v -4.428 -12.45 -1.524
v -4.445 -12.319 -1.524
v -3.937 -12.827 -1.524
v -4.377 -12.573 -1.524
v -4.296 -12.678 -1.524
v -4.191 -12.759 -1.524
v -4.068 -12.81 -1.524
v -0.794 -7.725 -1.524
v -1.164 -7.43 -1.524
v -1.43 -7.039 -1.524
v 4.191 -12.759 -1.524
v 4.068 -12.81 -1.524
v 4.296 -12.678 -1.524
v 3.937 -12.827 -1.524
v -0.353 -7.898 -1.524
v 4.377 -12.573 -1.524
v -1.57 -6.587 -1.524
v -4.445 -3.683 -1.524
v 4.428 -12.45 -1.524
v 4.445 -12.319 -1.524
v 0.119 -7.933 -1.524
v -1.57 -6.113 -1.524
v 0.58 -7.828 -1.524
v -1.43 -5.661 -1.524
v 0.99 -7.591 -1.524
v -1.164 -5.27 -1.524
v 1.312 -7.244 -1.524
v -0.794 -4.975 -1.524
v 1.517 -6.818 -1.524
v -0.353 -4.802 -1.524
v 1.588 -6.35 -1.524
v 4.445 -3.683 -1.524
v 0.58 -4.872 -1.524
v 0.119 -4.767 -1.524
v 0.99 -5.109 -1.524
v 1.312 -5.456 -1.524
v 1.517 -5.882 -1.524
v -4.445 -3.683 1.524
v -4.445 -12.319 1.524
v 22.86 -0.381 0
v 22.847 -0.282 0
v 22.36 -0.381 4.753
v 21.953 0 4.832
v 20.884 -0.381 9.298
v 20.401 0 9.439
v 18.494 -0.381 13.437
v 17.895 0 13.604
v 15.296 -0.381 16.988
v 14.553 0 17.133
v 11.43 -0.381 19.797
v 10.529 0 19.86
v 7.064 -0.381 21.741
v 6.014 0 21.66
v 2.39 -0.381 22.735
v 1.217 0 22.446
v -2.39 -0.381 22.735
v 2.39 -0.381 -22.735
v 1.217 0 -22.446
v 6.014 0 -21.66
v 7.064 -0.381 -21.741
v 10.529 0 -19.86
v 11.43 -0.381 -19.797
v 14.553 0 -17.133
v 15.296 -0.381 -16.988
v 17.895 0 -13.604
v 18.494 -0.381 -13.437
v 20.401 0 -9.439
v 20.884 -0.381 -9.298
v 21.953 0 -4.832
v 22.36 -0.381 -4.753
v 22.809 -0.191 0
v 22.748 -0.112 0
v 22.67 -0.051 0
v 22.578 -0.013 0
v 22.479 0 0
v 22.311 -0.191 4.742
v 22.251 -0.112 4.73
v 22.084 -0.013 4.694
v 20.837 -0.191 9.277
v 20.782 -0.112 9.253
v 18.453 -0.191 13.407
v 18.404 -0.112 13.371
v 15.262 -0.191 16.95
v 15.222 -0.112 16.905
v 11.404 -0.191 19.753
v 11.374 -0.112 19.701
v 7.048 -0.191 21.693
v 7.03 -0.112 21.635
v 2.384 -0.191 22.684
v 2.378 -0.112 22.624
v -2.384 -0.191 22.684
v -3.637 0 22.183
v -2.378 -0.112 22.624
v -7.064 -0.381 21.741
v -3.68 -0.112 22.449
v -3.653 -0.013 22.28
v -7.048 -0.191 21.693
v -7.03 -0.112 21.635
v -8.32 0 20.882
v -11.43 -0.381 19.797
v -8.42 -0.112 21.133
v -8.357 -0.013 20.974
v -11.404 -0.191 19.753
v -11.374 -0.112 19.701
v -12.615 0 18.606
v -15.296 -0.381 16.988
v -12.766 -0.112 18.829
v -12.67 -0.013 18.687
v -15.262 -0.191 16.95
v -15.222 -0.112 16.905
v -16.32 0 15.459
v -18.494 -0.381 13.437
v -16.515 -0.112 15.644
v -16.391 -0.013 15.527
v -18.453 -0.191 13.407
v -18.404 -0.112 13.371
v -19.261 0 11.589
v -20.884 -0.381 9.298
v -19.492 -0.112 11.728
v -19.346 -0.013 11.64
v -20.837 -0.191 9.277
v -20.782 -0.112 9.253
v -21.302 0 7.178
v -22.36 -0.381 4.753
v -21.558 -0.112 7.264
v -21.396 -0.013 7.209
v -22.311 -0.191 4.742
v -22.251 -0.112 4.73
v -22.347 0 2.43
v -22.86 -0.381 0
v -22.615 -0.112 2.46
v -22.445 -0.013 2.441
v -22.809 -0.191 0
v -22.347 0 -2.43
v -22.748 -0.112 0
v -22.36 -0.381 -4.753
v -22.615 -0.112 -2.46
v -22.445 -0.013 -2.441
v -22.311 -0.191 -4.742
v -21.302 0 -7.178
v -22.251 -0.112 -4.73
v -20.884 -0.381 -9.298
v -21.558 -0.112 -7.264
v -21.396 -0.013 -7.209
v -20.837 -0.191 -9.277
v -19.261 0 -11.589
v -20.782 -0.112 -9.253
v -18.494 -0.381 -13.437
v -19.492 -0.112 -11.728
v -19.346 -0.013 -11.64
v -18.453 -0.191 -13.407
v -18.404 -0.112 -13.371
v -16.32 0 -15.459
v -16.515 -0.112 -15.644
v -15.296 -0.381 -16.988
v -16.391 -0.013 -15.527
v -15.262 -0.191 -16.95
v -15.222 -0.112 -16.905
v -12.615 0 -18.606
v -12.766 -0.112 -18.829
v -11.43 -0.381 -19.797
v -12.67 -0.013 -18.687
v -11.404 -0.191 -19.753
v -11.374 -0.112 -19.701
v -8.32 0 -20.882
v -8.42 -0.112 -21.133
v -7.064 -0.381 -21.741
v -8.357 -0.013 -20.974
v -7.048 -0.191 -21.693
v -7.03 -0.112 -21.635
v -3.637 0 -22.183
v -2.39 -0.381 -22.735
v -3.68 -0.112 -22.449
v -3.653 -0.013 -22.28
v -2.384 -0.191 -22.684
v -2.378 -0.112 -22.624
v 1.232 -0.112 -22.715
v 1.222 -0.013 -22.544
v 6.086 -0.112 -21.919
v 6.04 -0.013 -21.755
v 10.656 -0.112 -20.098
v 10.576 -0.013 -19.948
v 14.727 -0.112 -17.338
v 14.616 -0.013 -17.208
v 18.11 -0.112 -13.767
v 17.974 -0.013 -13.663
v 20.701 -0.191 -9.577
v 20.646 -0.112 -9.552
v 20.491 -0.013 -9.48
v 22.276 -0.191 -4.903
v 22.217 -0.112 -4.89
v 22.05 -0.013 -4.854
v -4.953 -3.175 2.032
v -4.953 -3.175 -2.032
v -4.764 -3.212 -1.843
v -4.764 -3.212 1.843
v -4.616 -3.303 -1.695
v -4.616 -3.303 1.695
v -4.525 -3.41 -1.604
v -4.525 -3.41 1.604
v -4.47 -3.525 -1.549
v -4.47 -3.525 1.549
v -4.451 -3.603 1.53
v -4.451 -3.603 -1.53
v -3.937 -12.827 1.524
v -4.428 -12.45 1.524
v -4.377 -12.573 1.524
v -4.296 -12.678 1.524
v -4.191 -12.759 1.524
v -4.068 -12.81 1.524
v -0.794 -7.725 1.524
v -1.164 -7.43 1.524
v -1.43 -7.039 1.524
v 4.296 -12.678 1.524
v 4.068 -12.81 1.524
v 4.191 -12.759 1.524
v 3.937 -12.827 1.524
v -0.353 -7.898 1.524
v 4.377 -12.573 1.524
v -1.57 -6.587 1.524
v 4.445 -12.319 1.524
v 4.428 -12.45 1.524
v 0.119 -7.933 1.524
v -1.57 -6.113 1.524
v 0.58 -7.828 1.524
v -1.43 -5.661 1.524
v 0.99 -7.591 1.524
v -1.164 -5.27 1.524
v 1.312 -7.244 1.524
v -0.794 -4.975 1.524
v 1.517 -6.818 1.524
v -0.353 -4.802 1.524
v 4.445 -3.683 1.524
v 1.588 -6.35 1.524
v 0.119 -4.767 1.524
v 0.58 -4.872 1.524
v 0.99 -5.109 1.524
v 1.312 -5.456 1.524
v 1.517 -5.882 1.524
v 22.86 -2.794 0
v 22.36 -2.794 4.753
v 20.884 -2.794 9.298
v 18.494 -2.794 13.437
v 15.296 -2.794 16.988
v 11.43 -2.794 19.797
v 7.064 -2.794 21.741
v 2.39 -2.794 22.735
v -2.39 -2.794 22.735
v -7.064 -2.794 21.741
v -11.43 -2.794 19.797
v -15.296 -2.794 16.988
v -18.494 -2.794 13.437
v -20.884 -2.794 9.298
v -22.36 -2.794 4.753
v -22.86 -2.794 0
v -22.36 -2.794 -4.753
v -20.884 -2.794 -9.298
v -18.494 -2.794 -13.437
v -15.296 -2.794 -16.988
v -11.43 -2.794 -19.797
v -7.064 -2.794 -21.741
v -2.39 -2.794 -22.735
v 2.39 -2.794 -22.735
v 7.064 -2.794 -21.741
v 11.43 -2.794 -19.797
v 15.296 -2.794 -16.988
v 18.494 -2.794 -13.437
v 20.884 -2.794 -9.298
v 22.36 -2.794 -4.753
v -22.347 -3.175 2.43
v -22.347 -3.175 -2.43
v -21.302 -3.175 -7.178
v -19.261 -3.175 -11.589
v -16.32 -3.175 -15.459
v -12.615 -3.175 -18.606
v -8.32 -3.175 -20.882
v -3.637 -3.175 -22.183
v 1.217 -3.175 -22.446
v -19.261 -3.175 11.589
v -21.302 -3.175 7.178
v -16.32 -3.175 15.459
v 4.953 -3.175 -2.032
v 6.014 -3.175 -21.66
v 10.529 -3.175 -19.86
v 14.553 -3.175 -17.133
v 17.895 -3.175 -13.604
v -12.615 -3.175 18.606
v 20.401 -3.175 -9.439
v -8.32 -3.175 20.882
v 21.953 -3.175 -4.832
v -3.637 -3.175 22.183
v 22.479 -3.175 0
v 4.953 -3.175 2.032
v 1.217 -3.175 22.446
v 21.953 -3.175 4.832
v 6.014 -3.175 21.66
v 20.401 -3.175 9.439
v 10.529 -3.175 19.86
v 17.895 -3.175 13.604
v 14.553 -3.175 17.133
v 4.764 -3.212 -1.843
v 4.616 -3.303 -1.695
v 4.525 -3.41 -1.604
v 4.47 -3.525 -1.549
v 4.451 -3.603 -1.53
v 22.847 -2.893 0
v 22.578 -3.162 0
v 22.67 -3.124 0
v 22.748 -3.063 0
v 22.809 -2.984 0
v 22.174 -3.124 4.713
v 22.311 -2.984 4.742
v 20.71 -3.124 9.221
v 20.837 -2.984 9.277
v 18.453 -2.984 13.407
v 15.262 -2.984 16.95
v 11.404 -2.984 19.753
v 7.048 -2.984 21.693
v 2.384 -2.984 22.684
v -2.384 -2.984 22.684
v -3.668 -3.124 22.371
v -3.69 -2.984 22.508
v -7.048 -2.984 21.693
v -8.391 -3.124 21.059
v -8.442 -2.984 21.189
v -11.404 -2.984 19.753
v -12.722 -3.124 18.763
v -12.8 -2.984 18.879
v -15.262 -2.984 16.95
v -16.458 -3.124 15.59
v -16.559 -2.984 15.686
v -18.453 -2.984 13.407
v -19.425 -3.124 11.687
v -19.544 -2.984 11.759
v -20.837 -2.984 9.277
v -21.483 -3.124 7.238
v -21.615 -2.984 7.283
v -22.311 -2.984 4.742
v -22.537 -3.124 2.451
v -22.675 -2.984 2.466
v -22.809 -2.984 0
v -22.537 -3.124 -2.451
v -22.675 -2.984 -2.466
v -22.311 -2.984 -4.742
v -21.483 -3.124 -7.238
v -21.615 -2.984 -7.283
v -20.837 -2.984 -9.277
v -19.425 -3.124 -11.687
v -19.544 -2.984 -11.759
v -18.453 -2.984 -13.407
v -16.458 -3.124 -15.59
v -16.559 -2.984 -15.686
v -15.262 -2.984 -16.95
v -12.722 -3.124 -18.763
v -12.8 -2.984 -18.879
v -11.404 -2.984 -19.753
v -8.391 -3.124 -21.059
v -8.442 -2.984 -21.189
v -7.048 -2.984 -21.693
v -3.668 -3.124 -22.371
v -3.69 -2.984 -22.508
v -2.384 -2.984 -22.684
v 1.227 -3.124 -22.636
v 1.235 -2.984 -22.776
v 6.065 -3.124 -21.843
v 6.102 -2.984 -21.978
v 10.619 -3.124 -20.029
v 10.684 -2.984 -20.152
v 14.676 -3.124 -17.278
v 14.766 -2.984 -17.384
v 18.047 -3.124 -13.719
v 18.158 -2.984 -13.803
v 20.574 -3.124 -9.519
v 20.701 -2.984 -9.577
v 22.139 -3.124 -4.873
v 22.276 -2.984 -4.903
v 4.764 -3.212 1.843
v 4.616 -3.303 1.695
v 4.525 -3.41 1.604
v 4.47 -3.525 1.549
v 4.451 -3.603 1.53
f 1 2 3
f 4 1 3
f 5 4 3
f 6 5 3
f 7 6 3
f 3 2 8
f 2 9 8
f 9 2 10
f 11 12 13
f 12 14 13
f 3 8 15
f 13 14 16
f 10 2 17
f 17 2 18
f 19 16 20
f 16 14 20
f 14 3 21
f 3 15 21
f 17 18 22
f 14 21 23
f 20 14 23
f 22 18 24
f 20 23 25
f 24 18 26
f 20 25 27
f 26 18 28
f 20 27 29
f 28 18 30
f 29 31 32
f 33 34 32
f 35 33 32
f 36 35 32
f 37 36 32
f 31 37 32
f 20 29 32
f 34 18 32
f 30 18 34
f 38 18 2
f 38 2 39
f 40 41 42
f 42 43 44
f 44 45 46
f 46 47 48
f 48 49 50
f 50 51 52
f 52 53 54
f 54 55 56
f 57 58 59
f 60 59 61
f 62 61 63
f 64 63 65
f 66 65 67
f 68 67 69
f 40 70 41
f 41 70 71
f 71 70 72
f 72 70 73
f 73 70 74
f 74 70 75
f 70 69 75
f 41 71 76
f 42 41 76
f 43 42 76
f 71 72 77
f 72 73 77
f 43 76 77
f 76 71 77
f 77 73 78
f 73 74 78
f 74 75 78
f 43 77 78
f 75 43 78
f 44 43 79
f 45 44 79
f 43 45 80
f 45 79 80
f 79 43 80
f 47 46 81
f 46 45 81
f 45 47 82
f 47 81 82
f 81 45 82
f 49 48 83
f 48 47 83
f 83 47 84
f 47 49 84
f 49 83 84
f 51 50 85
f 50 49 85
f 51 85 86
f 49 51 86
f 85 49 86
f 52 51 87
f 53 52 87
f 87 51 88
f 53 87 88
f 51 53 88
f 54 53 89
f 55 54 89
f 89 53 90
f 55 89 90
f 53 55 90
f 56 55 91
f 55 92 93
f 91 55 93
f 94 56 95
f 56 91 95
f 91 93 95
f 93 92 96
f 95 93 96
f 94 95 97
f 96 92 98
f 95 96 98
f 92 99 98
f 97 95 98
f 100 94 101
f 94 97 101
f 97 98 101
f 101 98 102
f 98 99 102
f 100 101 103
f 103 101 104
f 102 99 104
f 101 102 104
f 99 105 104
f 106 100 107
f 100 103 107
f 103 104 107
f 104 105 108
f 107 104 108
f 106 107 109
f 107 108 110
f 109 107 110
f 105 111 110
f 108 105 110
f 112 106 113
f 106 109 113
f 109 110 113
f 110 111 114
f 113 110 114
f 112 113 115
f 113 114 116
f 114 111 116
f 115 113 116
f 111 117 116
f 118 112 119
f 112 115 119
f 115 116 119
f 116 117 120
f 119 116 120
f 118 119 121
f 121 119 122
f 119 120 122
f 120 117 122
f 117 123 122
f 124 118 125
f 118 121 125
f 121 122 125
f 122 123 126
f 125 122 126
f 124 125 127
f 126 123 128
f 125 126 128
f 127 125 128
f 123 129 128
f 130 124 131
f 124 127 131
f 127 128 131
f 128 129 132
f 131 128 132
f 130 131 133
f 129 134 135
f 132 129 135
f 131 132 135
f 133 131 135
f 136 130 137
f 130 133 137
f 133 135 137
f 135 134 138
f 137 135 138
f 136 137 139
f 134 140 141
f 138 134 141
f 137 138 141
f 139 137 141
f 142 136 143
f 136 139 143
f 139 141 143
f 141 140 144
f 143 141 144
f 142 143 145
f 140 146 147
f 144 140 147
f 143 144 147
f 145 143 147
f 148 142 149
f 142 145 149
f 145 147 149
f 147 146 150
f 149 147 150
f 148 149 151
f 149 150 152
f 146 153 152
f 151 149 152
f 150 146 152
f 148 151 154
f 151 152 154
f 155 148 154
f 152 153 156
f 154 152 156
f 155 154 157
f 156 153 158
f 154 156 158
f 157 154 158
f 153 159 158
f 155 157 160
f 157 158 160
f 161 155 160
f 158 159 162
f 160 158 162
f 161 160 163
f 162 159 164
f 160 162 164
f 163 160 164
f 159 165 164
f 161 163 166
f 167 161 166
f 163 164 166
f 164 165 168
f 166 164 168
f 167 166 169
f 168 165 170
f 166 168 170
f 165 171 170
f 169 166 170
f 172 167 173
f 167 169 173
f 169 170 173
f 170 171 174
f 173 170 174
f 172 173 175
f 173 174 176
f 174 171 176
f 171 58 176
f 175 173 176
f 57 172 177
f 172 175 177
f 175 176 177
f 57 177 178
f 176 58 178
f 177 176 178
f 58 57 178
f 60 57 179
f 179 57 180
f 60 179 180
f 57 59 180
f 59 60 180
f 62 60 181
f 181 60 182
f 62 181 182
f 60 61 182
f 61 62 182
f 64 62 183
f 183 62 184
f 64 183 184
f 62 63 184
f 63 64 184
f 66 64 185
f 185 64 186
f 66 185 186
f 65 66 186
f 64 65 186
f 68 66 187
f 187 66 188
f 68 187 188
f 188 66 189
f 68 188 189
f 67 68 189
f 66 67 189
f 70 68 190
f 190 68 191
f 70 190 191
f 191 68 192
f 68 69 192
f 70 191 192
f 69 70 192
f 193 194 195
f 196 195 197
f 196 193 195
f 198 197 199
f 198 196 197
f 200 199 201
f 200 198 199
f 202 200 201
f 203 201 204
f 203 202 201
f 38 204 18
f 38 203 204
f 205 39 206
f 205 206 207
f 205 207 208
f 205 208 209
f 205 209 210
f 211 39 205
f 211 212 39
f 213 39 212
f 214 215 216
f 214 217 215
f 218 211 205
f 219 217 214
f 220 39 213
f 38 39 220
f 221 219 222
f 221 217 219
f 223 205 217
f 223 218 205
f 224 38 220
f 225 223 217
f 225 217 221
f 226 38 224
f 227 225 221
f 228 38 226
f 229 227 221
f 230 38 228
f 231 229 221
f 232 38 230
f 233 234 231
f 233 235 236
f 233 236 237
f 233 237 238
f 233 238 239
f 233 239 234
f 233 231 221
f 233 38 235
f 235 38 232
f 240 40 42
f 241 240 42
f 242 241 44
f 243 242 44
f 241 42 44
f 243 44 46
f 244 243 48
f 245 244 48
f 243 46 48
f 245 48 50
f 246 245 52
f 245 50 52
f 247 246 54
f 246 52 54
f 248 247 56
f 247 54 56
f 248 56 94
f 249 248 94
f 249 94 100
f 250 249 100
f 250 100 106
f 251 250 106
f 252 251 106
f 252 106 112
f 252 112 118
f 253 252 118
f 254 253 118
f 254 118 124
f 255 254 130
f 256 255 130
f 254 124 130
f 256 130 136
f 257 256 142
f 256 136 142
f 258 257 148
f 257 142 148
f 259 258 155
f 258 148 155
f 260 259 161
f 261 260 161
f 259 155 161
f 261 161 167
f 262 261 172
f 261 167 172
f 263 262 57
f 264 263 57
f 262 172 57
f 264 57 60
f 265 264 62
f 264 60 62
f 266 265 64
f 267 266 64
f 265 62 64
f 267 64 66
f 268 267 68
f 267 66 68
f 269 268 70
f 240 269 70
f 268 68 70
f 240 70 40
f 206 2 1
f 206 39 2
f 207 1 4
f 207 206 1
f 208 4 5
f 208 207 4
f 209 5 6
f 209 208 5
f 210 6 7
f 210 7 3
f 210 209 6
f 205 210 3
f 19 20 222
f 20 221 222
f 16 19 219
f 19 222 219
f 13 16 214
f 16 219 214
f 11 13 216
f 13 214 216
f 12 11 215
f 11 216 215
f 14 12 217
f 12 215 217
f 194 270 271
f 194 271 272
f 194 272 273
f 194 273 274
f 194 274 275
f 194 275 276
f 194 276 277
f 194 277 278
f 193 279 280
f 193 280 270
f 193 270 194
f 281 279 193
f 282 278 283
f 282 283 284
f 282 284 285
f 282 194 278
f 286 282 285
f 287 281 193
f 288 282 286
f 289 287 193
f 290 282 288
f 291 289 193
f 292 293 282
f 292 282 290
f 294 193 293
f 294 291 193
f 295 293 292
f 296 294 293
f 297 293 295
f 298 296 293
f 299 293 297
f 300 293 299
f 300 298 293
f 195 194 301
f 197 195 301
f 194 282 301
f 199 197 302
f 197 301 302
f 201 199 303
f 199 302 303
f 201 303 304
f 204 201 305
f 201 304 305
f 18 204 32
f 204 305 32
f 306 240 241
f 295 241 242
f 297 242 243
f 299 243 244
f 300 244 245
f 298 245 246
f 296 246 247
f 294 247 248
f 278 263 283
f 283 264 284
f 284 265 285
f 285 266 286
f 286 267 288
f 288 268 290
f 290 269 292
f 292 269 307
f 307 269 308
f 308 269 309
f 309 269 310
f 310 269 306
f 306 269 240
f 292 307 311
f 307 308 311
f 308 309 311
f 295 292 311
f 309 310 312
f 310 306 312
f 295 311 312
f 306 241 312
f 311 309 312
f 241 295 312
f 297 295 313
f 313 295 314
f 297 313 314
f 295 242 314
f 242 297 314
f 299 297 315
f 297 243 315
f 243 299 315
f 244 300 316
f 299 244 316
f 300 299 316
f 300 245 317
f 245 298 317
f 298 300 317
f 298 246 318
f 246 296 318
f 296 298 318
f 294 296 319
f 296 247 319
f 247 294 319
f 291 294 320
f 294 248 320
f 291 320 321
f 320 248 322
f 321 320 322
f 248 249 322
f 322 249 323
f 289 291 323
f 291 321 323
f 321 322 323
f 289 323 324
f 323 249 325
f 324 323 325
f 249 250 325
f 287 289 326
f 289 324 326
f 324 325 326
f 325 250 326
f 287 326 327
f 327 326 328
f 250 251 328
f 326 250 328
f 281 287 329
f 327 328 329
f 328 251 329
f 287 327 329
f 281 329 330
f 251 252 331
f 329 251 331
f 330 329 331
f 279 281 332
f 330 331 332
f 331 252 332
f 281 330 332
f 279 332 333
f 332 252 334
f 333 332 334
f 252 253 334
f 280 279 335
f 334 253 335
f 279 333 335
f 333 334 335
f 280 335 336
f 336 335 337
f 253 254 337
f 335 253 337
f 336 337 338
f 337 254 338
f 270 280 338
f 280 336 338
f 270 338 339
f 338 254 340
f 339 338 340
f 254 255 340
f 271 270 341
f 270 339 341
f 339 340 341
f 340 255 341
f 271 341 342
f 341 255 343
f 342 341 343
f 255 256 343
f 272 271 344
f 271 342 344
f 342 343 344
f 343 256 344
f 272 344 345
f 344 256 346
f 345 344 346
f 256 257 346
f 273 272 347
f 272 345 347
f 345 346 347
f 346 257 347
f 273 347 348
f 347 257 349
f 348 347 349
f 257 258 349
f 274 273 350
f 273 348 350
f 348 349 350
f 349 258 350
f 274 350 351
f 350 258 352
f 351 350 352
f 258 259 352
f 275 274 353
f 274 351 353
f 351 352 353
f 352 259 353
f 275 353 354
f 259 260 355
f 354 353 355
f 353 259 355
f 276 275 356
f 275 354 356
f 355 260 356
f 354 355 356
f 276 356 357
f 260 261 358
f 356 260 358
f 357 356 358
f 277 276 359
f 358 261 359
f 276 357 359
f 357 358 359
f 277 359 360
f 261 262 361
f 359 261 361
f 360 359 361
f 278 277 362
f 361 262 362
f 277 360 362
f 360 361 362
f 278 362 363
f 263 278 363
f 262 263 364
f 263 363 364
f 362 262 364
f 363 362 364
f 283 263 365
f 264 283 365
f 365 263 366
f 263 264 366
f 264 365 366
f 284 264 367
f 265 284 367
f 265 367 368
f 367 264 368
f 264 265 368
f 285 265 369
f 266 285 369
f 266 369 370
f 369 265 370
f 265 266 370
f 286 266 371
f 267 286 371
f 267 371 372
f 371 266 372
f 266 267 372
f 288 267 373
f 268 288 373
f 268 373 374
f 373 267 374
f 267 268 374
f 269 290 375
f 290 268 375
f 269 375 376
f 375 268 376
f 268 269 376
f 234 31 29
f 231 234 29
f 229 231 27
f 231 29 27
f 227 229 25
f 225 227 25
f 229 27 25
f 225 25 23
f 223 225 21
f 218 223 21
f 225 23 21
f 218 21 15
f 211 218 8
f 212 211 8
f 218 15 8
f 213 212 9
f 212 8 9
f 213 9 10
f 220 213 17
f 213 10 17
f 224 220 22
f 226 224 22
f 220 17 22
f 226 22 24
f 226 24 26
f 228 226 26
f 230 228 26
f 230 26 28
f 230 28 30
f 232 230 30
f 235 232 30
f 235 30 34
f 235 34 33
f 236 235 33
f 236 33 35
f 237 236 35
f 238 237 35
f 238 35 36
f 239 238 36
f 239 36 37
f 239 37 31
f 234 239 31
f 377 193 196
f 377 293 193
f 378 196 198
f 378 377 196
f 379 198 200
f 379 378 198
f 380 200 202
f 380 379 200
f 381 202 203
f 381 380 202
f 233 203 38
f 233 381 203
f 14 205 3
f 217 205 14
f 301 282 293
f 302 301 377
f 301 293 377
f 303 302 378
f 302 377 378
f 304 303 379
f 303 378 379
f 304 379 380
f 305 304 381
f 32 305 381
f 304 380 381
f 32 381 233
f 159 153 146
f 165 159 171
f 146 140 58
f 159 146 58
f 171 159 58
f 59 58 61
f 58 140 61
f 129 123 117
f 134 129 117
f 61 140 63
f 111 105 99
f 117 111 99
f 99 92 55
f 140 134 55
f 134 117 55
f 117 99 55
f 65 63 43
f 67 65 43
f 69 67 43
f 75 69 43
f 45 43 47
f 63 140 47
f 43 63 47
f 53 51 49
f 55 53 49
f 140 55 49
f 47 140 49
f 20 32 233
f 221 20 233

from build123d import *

# Parameters (mm, degrees)
F0_R     = 22.86
F1_DEPTH = 3.175
F2_W     = 8.89
F2_H     = 3.048
F3_DEPTH = 9.652
F4_R     = 1.5875
F5_DEPTH = 24.385
F6_R     = 0.508
F7_R     = 0.381


with BuildPart() as f1:
    # F0 (on Front) → F1 (new body)
    with BuildSketch(Plane.XZ):
        Circle(F0_R)
    extrude(amount=F1_DEPTH)

    # F2 (on face) → F3 (join)
    with BuildSketch(Plane.XZ.offset(3.175)):
        Rectangle(F2_W, F2_H)
    extrude(amount=F3_DEPTH)

    # F4 (on face) → F5 (cut, through all)
    with BuildSketch(Plane(origin=(0, 0, -1.524), x_dir=(1, 0, 0), z_dir=(0, 0, -1))):
        with Locations((0, 6.35)):
            Circle(F4_R)
    extrude(amount=-F5_DEPTH, mode=Mode.SUBTRACT)

    # F6
    f6_edges = [f1.edges().sort_by_distance(p)[0] for p in [
        (-4.445, -12.827, 0),
        (4.445, -12.827, 0),
        (0, -3.175, -1.524),
        (-4.445, -3.175, 0),
        (4.445, -3.175, 0),
        (0, -3.175, 1.524),
    ]]
    fillet(f6_edges, radius=F6_R)

    # F7
    f7_edges = [f1.edges().sort_by_distance(p)[0] for p in [
        (-22.86, -3.175, 0),
        (-22.86, 0, 0),
    ]]
    fillet(f7_edges, radius=F7_R)


solid = f1.part
